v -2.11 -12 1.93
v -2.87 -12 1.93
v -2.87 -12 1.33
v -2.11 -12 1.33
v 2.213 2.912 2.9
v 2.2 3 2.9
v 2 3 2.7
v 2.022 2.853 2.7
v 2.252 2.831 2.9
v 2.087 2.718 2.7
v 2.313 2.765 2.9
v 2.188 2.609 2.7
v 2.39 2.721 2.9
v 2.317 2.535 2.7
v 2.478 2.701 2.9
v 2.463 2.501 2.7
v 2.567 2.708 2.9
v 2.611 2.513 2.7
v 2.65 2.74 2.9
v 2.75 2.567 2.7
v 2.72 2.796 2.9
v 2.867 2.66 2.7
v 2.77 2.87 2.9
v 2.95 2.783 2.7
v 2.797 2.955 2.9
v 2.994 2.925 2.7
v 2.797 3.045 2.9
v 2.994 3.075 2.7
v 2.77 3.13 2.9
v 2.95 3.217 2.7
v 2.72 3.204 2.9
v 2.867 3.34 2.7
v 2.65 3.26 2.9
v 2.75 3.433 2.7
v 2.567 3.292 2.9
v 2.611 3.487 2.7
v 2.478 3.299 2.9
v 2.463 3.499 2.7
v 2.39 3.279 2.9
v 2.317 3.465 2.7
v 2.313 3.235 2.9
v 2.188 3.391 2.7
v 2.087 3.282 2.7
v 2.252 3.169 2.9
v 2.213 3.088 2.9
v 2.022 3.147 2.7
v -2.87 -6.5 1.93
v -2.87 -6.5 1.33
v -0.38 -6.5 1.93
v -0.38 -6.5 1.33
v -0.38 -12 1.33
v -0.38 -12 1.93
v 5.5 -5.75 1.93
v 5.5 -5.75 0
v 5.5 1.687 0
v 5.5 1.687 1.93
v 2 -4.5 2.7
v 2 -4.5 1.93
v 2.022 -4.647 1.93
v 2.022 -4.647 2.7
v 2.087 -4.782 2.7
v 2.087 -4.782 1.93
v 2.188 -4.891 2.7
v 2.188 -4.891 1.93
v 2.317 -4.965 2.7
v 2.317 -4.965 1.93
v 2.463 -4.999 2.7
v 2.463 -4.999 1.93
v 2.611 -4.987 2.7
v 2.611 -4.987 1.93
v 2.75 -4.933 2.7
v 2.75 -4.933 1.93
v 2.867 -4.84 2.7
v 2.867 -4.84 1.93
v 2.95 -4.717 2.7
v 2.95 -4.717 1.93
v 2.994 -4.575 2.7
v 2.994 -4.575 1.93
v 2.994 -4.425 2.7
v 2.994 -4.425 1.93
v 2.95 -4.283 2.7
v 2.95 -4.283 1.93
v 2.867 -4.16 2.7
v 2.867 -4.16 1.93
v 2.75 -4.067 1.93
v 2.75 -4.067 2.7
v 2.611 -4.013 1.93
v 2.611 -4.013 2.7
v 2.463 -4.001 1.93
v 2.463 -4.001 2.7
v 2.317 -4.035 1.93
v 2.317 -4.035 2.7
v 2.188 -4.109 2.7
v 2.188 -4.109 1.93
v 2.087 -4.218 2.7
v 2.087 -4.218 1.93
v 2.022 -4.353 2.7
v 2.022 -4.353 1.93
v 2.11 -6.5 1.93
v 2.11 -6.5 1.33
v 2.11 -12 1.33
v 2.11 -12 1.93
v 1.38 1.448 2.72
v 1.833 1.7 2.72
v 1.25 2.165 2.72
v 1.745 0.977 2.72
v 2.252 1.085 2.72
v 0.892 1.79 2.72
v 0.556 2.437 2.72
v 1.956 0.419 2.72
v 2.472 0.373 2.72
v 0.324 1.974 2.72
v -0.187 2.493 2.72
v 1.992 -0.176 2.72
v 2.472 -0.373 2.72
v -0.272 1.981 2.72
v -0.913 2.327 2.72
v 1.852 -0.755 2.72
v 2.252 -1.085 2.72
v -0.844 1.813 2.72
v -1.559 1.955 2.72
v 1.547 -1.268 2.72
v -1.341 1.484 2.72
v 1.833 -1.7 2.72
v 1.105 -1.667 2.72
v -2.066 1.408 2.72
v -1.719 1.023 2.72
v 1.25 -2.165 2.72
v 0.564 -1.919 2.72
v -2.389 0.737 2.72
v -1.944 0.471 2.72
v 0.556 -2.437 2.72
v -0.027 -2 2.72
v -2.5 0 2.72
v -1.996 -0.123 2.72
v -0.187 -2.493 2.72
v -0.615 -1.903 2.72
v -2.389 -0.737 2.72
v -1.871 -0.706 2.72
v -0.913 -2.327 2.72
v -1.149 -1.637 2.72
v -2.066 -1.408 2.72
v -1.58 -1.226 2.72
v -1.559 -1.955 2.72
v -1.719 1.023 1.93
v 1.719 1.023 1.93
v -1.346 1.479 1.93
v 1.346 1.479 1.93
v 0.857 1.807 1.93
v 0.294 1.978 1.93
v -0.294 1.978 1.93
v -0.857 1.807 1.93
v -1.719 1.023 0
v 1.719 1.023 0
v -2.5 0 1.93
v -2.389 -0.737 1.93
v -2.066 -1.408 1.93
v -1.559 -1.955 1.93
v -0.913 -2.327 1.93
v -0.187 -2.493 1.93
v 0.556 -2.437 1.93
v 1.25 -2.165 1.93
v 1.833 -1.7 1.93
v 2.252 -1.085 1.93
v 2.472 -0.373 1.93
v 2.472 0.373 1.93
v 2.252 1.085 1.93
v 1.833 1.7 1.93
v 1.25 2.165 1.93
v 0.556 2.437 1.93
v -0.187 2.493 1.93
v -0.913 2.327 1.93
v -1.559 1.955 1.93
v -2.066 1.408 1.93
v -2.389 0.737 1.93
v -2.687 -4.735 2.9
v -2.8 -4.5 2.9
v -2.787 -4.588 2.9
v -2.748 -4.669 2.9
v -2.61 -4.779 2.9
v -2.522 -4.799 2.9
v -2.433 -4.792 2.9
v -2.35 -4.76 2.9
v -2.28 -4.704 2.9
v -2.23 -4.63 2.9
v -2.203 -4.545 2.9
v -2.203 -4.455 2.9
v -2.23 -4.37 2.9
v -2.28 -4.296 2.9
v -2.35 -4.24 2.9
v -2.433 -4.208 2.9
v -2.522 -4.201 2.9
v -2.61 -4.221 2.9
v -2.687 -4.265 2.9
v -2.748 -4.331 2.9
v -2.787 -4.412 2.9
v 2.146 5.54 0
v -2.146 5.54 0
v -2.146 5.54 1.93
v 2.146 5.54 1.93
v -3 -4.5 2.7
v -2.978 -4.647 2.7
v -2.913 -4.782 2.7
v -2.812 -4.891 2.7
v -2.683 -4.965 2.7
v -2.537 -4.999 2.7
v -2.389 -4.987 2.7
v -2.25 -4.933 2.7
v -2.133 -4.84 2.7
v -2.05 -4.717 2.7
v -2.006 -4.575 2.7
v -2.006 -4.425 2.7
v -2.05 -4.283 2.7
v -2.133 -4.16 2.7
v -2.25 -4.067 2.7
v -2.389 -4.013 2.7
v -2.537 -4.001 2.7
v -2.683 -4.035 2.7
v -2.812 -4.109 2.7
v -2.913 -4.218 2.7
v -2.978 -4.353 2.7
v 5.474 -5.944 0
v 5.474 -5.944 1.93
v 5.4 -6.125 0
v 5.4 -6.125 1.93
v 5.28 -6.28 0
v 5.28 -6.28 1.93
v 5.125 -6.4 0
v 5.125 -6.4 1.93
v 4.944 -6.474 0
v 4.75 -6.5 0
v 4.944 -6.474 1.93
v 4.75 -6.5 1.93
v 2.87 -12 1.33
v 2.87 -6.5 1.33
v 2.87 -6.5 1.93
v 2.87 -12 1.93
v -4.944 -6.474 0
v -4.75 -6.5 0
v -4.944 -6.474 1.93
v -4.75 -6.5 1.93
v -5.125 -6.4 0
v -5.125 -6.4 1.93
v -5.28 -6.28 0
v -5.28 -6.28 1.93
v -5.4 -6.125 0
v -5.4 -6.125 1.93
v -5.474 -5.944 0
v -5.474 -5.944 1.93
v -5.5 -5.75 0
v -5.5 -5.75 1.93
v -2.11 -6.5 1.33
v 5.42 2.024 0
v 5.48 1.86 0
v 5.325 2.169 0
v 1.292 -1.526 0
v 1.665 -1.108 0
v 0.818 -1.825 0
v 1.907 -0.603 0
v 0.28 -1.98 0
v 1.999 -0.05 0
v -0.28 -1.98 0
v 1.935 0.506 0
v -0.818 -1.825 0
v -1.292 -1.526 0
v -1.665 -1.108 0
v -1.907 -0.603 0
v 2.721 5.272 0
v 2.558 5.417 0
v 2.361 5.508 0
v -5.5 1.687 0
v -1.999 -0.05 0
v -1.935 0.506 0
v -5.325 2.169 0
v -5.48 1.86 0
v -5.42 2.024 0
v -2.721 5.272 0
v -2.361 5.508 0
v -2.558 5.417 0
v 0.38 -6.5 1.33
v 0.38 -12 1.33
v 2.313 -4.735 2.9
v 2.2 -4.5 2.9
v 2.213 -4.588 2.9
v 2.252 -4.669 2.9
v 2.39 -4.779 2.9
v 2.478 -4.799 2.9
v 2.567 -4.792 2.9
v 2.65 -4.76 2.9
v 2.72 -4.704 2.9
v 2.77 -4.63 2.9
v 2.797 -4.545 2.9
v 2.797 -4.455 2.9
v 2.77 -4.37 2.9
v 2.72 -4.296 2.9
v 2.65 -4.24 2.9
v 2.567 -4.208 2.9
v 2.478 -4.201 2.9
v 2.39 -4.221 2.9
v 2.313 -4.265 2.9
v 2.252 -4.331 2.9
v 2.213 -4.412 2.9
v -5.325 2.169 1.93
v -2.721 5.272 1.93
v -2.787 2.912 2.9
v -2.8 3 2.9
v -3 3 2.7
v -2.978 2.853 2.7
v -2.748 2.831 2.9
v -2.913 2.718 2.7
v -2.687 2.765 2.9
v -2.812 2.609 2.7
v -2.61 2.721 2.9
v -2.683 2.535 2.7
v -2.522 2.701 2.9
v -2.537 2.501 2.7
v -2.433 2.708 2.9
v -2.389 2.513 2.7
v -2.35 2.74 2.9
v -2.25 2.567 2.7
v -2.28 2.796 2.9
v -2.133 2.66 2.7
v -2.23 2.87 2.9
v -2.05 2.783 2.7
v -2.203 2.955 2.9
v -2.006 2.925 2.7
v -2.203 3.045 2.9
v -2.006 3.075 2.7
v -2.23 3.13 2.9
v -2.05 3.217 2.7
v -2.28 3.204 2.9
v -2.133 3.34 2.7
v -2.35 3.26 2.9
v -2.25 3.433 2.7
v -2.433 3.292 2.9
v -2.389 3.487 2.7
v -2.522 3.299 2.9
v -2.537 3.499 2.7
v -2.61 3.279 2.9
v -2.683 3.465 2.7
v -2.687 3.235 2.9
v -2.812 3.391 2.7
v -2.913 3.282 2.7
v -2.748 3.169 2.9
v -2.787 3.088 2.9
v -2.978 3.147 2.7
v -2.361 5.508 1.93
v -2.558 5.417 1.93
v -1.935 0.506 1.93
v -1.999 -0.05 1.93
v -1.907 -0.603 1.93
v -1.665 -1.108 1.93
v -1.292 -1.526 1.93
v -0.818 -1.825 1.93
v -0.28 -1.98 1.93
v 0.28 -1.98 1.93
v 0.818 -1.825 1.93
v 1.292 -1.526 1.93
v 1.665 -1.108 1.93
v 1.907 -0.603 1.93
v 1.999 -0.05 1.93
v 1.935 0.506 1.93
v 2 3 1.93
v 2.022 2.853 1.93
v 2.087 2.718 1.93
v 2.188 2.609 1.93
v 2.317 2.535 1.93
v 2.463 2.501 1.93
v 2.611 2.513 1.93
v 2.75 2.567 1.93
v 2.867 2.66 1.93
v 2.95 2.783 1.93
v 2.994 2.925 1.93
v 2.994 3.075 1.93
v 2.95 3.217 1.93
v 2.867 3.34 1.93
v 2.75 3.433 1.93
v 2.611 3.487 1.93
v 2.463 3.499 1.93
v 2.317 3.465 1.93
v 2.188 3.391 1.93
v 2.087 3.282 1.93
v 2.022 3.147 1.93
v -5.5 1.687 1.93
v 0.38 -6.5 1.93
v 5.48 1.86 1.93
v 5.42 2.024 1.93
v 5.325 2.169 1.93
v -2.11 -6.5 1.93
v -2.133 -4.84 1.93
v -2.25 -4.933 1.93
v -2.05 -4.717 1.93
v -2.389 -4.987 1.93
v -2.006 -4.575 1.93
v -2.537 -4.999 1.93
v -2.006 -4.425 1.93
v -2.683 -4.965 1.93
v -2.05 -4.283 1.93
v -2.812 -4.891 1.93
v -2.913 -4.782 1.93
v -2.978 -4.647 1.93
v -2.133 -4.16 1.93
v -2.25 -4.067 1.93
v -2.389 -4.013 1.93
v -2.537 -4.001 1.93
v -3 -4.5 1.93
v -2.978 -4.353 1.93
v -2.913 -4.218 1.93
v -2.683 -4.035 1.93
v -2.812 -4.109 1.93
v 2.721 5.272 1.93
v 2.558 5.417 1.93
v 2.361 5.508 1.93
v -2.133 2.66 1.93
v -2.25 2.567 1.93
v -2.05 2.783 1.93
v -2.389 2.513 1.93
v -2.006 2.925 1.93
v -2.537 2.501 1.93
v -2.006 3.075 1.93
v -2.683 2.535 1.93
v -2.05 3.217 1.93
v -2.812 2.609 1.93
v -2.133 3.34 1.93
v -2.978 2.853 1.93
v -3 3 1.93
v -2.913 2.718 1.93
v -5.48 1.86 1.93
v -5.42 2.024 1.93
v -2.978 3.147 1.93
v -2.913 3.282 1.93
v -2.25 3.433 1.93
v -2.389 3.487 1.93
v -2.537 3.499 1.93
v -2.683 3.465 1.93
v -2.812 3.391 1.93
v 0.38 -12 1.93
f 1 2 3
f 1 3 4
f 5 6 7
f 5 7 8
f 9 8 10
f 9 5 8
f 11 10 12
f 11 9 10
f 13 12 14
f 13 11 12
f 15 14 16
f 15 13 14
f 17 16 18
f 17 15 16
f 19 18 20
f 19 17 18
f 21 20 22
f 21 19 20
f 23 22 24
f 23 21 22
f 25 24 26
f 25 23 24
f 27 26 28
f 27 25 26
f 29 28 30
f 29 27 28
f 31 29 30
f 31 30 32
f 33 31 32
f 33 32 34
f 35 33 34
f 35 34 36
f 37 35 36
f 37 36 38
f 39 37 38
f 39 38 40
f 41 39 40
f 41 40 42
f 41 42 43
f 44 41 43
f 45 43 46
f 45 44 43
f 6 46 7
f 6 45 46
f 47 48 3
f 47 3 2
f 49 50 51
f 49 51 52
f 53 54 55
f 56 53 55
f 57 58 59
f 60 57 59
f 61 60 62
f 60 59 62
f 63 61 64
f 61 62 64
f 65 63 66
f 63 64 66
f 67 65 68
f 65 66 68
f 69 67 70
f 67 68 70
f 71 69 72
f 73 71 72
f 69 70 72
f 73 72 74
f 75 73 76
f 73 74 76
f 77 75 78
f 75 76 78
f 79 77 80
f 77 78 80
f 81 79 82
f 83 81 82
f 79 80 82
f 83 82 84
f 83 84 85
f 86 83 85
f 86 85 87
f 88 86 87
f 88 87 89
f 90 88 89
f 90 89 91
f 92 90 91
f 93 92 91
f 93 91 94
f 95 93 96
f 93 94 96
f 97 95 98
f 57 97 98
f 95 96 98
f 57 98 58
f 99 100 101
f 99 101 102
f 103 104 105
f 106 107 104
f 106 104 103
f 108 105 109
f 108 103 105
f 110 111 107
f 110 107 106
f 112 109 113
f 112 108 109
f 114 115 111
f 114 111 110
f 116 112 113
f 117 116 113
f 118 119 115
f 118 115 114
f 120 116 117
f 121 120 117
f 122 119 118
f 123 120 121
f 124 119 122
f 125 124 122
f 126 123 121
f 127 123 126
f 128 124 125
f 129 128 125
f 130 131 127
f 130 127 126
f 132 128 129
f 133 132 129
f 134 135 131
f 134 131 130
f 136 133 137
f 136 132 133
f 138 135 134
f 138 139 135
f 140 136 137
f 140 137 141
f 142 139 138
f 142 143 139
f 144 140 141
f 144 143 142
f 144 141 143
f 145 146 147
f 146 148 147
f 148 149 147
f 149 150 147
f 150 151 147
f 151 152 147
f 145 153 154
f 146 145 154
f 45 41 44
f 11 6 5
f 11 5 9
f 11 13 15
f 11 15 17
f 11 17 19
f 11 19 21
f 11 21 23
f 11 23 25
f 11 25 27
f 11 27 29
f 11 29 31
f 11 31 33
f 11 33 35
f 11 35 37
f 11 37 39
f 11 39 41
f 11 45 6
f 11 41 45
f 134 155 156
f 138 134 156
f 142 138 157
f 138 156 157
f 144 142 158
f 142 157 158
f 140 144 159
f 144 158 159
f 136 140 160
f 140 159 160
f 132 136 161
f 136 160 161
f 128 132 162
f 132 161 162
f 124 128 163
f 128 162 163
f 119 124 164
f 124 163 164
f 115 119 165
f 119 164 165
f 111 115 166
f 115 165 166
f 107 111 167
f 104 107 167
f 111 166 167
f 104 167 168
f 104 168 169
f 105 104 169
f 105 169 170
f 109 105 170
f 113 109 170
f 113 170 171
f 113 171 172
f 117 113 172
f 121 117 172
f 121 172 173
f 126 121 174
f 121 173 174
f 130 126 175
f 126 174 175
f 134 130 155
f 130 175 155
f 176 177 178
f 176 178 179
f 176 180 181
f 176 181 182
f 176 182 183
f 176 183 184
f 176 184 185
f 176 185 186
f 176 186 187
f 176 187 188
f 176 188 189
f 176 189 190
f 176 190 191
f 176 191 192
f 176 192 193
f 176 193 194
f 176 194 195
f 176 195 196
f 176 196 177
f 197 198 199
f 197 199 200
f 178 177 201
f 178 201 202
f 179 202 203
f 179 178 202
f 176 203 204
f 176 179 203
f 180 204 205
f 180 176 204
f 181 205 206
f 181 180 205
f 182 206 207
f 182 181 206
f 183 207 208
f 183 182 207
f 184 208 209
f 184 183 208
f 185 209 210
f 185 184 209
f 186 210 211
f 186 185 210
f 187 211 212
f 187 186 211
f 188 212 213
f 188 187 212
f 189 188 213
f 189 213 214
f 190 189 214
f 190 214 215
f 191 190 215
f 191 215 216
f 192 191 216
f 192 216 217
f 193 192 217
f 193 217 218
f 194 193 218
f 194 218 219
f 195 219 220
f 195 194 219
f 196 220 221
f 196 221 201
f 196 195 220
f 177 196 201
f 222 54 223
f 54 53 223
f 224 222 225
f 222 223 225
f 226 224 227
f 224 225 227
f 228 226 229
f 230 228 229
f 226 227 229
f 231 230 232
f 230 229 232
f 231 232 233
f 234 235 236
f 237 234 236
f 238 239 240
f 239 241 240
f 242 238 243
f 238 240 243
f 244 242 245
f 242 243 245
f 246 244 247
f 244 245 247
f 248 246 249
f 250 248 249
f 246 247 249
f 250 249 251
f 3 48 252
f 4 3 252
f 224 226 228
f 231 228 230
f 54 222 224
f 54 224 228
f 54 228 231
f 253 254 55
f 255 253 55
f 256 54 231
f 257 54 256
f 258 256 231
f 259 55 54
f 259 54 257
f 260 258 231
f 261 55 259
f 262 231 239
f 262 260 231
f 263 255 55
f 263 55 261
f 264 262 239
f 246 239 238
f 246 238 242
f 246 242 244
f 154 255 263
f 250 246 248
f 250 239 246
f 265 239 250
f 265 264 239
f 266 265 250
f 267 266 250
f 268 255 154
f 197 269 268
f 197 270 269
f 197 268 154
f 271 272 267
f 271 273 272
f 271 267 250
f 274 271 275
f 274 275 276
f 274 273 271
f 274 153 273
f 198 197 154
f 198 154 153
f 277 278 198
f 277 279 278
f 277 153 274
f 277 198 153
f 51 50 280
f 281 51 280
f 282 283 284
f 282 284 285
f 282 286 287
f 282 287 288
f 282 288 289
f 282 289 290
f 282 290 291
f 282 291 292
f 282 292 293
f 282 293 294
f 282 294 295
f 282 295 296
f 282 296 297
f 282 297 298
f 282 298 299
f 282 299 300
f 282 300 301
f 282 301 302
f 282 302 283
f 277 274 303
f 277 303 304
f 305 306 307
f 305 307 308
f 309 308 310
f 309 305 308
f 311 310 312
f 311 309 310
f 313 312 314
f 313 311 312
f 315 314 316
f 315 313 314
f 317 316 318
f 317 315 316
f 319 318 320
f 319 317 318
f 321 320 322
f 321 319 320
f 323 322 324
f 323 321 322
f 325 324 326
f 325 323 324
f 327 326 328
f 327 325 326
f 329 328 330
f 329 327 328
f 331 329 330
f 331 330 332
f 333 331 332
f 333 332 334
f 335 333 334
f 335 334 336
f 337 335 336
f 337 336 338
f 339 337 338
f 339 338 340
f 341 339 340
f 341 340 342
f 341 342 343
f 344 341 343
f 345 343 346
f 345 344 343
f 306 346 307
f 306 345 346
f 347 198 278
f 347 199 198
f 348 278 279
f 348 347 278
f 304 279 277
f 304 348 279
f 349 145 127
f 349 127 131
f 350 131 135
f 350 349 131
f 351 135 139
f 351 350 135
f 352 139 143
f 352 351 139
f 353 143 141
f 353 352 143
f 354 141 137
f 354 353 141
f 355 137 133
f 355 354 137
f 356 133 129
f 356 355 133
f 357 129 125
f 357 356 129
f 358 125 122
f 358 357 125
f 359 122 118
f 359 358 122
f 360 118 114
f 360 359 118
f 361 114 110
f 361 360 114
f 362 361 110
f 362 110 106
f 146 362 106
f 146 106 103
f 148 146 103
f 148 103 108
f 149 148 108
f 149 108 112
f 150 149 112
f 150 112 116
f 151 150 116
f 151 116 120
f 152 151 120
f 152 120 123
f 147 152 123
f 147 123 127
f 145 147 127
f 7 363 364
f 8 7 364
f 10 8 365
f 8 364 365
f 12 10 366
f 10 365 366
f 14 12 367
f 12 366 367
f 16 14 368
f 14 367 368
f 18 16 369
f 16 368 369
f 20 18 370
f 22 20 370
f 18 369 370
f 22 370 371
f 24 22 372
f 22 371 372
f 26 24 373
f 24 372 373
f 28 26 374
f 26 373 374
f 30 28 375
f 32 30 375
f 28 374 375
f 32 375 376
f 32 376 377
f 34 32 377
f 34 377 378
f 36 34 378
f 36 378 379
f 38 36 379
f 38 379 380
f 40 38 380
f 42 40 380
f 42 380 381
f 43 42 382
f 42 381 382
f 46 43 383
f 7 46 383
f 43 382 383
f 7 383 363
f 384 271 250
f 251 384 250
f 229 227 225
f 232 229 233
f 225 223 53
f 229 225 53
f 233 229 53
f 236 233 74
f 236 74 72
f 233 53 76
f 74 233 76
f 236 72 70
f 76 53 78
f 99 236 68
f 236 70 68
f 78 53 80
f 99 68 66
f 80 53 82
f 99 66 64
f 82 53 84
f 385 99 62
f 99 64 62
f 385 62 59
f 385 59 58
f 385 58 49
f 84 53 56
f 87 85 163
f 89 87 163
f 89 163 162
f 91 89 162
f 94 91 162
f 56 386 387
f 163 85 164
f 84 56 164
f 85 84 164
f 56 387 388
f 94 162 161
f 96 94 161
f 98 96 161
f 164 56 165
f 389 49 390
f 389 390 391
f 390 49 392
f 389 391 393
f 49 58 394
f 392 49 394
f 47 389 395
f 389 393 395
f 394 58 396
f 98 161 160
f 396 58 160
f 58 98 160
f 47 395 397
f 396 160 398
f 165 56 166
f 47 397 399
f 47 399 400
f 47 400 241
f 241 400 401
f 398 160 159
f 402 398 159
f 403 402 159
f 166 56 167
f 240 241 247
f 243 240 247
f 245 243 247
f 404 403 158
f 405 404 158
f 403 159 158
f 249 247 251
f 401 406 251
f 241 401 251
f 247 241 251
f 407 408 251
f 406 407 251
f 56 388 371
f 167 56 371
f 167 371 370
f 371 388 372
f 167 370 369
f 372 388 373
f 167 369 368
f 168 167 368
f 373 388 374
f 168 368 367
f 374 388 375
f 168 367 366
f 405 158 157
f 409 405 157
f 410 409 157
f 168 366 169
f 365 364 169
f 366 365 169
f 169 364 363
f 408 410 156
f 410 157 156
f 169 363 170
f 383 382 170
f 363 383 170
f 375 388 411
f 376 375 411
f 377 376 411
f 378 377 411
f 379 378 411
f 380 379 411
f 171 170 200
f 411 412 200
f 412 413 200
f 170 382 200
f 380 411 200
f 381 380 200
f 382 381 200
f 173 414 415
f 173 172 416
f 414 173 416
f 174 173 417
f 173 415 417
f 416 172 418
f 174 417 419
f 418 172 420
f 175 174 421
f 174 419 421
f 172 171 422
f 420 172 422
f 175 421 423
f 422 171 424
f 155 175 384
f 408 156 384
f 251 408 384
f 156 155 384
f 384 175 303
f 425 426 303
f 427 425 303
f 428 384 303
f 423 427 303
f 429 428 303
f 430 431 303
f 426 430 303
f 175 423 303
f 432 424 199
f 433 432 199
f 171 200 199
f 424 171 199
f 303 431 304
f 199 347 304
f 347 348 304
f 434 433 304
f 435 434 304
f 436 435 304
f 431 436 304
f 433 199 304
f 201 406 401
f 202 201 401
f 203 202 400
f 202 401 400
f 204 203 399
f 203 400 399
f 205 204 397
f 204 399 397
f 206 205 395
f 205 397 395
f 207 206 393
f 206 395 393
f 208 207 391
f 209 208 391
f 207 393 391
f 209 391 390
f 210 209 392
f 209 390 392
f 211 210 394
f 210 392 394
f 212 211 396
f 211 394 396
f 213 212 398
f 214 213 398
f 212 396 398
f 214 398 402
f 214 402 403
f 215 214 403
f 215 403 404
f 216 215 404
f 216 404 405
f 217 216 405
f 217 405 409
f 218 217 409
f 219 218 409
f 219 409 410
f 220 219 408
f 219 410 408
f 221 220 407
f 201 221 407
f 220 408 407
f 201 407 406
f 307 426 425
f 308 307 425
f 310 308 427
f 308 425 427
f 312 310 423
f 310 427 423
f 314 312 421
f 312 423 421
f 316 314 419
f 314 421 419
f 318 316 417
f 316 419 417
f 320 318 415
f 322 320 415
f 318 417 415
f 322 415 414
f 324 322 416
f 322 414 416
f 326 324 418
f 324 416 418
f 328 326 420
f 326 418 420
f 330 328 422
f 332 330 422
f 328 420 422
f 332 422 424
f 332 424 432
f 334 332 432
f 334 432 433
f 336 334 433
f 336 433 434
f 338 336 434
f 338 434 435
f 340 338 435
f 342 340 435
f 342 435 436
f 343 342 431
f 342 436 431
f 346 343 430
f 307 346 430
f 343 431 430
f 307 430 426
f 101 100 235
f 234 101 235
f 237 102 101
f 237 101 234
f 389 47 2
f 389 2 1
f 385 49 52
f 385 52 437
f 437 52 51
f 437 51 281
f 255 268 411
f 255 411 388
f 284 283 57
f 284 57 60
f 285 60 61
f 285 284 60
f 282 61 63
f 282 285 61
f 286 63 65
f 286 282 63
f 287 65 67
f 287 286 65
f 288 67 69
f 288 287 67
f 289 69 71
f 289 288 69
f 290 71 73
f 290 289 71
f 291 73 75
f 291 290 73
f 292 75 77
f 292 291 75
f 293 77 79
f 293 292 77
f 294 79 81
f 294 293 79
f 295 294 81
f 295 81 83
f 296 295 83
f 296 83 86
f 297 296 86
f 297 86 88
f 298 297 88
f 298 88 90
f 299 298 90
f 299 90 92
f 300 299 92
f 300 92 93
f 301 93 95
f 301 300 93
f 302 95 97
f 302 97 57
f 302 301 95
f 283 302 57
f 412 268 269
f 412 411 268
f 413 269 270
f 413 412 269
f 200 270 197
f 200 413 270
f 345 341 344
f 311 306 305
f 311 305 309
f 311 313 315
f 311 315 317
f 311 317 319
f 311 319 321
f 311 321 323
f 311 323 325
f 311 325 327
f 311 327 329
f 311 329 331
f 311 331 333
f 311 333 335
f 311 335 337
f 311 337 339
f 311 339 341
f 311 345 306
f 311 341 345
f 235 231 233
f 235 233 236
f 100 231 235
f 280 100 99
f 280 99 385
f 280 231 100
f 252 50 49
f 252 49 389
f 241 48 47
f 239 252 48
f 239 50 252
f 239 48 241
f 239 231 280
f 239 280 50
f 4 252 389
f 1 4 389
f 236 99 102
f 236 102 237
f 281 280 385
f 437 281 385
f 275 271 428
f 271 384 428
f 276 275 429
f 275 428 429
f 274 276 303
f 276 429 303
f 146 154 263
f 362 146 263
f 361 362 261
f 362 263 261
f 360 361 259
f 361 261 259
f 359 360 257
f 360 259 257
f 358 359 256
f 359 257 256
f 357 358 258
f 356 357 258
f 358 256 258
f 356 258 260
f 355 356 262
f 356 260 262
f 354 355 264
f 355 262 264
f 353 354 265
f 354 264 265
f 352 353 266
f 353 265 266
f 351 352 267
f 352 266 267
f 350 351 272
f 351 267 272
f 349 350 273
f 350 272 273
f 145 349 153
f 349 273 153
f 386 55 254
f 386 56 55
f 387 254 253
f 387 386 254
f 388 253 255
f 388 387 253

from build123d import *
from build123d.topology import SkipClean

# Parameters (mm, degrees)
BOSS_EXTRUDE1_DEPTH = 1.93
SKETCH2_R           = 2.5
SKETCH2_R_2         = 2
BOSS_EXTRUDE2_DEPTH = 0.79
FILLET2_R           = 0.75
SKETCH5_R           = 0.5
BOSS_EXTRUDE4_DEPTH = 0.97
CHAMFER1_SIZE       = 0.2
SKETCH6_W           = 0.76
SKETCH6_H           = 0.6
BOSS_EXTRUDE5_DEPTH = 5.5


with BuildPart() as part:
    # Sketch1 → Boss-Extrude1 (new body)
    with BuildSketch(Plane.XY):
        Polygon((5.5, 0), (5.5, -6.5), (-5.5, -6.5), (-5.5, 0), (-5.5, 1.96), (-2.49602332, 5.54), (2.49602332, 5.54), (5.5, 1.96), align=None)
        with BuildLine():
            Line((-1.718566554, 1.023), (1.718566554, 1.023))
            ThreePointArc((1.718566554, 1.023), (0, -2), (-1.718566554, 1.023))
        make_face(mode=Mode.SUBTRACT)
    extrude(amount=BOSS_EXTRUDE1_DEPTH)

    # Sketch2 → Boss-Extrude2 (add)
    with SkipClean():  # the faces are left unmerged after this step: merging them gives an invalid solid
        with BuildSketch(Plane.XY.offset(1.93)):
            with Locations(Location((0, 0, 0), (0, 0, 180))):
                Circle(SKETCH2_R)
            with Locations(Location((0, 0, 0), (0, 0, 149.236204264))):
                Circle(SKETCH2_R_2, mode=Mode.SUBTRACT)
        extrude(amount=BOSS_EXTRUDE2_DEPTH)

    # Fillet2
    fillet2_edges = [part.edges().sort_by_distance(p)[0] for p in [
        (5.5, -6.5, 0.965),
        (-5.5, -6.5, 0.965),
        (-5.5, 1.96, 0.965),
        (-2.49602332, 5.54, 0.965),
        (2.49602332, 5.54, 0.965),
        (5.5, 1.96, 0.965),
    ]]
    fillet(fillet2_edges, radius=FILLET2_R)

    # Sketch5 → Boss-Extrude4 (add)
    with SkipClean():  # the faces are left unmerged after this step: merging them gives an invalid solid
        with BuildSketch(Plane.XY.offset(1.93)):
            with Locations(Location((-2.5, -4.5, 0), (0, 0, 180))):
                Circle(SKETCH5_R)
            with Locations(Location((2.5, -4.5, 0), (0, 0, 180))):
                Circle(SKETCH5_R)
            with Locations(Location((2.5, 3, 0), (0, 0, 180))):
                Circle(SKETCH5_R)
            with Locations(Location((-2.5, 3, 0), (0, 0, 180))):
                Circle(SKETCH5_R)
        extrude(amount=BOSS_EXTRUDE4_DEPTH)

    # Chamfer1
    chamfer1_edges = [part.edges().sort_by_distance(p)[0] for p in [
        (3, -4.5, 2.9),
        (-2, -4.5, 2.9),
        (3, 3, 2.9),
        (-2, 3, 2.9),
    ]]
    chamfer(chamfer1_edges, length=CHAMFER1_SIZE)

    # Sketch6 → Boss-Extrude5 (add)
    with SkipClean():  # the faces are left unmerged after this step: merging them gives an invalid solid
        with BuildSketch(Plane.XZ.offset(6.5)):
            with Locations((-2.49, 1.63)):
                Rectangle(SKETCH6_W, SKETCH6_H)
            with Locations((0, 1.63)):
                Rectangle(SKETCH6_W, SKETCH6_H)
            with Locations((2.49, 1.63)):
                Rectangle(SKETCH6_W, SKETCH6_H)
        extrude(amount=BOSS_EXTRUDE5_DEPTH)


solid = part.part
